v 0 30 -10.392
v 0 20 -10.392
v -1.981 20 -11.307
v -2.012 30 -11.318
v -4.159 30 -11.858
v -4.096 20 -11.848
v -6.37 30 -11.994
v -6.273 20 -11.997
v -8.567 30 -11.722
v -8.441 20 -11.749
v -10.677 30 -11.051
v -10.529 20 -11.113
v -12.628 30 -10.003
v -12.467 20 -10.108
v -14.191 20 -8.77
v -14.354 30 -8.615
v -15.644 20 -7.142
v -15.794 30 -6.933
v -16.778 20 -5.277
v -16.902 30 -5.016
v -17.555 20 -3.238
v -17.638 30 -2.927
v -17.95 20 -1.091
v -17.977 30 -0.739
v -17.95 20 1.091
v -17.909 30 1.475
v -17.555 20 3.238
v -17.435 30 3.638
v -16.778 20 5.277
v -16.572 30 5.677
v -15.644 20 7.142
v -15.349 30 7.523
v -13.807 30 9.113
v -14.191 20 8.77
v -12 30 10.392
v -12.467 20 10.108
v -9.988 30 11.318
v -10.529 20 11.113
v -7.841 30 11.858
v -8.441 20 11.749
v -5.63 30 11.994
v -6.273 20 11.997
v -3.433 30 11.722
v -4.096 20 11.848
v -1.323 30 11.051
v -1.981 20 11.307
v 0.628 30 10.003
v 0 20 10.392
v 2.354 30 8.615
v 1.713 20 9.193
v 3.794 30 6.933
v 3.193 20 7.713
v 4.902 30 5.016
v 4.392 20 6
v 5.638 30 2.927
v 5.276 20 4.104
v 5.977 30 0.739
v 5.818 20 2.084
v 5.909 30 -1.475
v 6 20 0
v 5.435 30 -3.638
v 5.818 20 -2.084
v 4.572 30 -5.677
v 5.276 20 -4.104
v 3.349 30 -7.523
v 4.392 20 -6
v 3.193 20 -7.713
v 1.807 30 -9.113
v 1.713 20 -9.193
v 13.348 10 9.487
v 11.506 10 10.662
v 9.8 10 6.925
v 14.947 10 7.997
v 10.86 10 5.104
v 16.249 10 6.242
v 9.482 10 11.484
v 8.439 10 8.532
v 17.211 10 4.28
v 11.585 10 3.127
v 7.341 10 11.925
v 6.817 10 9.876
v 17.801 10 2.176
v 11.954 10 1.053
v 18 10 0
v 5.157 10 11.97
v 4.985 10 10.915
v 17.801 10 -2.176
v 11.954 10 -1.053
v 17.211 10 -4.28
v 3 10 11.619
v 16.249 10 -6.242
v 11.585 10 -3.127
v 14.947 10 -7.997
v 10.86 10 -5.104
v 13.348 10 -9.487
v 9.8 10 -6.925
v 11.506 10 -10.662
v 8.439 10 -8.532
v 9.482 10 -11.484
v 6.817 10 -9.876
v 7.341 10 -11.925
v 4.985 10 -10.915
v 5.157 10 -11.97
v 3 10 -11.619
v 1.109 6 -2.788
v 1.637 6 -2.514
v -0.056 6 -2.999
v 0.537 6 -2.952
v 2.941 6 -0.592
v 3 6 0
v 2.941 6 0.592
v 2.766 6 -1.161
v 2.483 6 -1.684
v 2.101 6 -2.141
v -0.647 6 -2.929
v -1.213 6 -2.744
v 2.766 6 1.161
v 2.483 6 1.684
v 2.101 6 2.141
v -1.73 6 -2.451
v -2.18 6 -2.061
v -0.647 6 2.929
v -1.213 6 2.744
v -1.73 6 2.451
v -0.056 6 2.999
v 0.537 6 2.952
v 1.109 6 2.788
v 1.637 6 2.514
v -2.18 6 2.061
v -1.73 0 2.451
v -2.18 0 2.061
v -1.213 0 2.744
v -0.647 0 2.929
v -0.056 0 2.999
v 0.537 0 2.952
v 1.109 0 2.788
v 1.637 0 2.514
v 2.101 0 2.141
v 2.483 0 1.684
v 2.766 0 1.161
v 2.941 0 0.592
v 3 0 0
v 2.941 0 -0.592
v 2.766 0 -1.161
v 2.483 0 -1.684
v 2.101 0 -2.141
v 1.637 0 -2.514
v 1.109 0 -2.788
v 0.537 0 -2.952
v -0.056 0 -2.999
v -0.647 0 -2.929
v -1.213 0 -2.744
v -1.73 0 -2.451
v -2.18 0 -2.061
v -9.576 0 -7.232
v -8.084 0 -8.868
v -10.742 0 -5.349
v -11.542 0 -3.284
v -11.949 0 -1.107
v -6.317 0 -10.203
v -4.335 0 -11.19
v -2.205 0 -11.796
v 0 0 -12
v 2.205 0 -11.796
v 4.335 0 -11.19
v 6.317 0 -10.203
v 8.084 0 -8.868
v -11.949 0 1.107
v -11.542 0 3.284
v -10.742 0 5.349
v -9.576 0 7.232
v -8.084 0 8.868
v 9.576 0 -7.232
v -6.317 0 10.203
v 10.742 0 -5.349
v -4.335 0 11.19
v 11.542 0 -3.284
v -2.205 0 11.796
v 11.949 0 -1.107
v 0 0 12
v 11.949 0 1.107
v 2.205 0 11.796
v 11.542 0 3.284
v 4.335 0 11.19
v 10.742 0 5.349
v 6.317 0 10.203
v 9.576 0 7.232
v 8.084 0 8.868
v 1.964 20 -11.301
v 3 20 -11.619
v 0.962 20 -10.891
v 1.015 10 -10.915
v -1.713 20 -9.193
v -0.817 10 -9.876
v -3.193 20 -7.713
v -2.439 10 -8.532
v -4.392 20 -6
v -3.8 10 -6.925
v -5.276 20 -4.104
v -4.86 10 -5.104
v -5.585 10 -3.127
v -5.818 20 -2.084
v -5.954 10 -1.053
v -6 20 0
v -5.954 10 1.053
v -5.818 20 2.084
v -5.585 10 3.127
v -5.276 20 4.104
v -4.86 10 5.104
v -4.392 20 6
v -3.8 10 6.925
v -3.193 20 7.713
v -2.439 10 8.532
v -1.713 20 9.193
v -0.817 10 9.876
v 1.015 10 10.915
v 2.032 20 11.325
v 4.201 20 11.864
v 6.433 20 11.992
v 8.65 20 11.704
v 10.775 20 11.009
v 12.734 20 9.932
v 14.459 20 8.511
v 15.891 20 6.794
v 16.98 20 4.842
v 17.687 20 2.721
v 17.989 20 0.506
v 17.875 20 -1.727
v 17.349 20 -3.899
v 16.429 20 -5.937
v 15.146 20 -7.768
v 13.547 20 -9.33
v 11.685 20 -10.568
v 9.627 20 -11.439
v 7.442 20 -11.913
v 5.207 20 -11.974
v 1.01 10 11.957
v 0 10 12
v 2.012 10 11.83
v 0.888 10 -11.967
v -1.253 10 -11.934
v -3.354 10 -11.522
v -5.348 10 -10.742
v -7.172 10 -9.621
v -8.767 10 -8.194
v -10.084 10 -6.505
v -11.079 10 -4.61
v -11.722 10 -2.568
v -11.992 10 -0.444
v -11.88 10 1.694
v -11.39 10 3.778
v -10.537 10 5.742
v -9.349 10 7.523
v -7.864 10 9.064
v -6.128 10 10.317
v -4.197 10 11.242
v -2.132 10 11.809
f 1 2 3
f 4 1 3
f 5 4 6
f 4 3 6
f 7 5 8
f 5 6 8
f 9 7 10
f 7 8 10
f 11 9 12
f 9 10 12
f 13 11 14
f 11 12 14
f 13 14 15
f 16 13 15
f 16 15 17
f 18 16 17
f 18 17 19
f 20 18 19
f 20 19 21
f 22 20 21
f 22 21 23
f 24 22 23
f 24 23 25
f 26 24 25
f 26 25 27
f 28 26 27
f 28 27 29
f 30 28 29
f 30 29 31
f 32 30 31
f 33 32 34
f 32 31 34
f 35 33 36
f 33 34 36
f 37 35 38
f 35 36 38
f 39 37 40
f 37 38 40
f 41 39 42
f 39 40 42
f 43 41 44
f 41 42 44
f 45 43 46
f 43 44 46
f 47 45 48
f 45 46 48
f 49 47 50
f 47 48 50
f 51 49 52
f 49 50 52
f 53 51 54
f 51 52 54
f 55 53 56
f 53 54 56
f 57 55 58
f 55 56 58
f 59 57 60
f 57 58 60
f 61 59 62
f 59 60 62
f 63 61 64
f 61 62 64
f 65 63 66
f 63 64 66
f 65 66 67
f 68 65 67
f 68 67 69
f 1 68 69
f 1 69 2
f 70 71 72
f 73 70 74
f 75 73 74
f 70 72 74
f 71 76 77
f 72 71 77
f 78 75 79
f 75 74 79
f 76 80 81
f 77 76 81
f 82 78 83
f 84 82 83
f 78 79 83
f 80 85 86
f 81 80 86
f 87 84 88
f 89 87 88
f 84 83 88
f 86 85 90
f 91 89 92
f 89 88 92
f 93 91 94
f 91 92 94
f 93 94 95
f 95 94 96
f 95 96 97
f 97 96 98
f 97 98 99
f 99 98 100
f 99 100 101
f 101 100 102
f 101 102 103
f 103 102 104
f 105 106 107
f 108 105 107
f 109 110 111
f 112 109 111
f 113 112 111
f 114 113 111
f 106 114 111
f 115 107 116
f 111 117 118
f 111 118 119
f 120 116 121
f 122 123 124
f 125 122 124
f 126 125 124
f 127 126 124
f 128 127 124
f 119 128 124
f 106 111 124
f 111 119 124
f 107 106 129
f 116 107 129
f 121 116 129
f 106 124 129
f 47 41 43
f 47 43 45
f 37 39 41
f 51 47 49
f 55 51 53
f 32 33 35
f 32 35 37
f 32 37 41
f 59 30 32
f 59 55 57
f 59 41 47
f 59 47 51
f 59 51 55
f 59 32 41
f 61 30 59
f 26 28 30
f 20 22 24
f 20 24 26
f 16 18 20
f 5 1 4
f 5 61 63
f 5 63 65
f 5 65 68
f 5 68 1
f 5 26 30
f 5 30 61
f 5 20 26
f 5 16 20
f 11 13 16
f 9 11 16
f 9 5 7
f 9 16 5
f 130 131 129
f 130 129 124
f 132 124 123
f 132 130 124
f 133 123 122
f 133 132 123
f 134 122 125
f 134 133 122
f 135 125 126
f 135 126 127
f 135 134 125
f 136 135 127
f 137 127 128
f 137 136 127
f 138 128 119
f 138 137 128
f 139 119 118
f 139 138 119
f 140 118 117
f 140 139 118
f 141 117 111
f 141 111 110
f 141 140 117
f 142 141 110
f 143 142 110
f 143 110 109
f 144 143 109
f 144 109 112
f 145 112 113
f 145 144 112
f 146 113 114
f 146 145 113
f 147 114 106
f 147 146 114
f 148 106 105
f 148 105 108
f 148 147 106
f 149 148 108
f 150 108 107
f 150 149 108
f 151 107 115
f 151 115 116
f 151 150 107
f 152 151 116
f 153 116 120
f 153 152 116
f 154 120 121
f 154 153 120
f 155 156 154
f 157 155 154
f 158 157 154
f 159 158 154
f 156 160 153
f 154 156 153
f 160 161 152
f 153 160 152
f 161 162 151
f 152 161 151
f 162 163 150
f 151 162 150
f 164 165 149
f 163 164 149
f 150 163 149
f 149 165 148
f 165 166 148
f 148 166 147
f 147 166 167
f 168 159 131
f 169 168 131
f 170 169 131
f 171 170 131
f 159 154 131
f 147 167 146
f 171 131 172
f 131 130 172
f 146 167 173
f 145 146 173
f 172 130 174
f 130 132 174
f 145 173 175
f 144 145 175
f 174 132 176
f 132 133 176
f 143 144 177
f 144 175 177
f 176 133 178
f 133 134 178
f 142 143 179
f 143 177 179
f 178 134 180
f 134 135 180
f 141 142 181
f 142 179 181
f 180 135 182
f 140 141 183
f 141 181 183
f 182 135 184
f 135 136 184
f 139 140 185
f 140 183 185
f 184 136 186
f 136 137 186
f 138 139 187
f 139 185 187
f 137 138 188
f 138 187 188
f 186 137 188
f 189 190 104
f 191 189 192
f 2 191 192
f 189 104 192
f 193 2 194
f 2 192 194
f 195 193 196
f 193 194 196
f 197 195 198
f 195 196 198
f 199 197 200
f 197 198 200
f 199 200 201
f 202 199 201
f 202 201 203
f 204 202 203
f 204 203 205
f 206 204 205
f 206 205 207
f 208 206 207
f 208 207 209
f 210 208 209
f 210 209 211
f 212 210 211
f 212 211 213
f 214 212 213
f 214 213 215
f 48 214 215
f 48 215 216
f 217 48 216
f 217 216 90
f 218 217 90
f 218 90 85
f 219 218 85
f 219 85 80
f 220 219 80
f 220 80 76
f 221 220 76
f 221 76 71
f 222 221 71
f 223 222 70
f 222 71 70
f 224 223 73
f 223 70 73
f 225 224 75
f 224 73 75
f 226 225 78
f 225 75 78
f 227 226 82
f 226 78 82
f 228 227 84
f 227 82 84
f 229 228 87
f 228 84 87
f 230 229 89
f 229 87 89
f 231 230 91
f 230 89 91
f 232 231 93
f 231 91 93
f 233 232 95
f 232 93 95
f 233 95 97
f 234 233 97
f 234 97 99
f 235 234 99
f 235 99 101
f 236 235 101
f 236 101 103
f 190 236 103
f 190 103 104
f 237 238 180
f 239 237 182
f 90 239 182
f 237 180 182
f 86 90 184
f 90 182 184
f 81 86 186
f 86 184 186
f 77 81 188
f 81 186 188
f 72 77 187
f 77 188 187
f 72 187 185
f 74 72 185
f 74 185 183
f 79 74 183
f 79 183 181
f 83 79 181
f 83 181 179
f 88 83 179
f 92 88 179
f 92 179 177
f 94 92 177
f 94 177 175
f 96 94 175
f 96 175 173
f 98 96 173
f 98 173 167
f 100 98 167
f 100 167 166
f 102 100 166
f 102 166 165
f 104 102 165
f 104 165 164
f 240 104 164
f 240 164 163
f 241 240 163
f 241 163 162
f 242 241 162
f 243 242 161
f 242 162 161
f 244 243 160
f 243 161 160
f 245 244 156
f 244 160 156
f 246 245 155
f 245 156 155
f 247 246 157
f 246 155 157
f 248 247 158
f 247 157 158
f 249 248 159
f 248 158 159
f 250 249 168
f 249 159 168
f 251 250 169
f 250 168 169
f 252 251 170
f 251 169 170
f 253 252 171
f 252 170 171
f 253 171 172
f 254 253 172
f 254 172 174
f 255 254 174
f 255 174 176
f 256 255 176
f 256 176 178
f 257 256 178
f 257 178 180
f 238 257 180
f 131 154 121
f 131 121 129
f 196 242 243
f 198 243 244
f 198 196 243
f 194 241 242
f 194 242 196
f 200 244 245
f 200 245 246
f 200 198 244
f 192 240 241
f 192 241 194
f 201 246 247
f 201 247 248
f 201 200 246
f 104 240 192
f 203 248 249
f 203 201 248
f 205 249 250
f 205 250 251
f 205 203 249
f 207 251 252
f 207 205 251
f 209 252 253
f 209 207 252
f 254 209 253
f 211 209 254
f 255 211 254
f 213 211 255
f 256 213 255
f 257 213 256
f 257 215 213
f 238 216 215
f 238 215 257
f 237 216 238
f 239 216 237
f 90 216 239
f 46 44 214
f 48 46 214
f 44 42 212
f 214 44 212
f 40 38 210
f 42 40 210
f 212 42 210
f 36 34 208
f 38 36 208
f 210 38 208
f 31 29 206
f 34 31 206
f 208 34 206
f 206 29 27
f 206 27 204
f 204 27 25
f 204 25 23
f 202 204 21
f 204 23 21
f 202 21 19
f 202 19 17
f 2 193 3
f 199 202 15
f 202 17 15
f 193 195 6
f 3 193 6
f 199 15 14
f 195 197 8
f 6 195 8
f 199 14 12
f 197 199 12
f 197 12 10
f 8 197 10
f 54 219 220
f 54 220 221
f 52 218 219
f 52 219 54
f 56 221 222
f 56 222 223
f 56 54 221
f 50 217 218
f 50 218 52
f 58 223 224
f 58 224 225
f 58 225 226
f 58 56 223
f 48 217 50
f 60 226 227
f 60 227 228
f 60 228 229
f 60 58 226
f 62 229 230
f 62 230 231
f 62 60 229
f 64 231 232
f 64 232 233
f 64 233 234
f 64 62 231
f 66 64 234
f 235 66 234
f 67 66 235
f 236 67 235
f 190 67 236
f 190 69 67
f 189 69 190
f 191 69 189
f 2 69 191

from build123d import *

# Parameters (mm, degrees)
SKETCH1_R           = 12
BOSS_EXTRUDE1_DEPTH = 10
SKETCH2_R           = 12
BOSS_EXTRUDE2_DEPTH = 10
SKETCH3_R           = 12
BOSS_EXTRUDE3_DEPTH = 10
CUT_EXTRUDE1_DEPTH  = 6


with BuildPart() as part:
    # Sketch1 → Boss-Extrude1 (new body)
    with BuildSketch(Plane(origin=(0, 0, 0), x_dir=(1, 0, 0), z_dir=(0, 1, 0))):
        with Locations(Location((0, 0, 0), (0, 0, 270))):
            Circle(SKETCH1_R)
    extrude(amount=BOSS_EXTRUDE1_DEPTH)

    # Sketch2 → Boss-Extrude2 (add)
    with BuildSketch(Plane(origin=(0, 10, 0), x_dir=(1, 0, 0), z_dir=(0, 1, 0))):
        with Locations(Location((6, 0, 0), (0, 0, 104.477512186))):
            Circle(SKETCH2_R)
    extrude(amount=BOSS_EXTRUDE2_DEPTH)

    # Sketch3 → Boss-Extrude3 (add)
    with BuildSketch(Plane(origin=(0, 20, 0), x_dir=(1, 0, 0), z_dir=(0, 1, 0))):
        with Locations(Location((-6, 0, 0), (0, 0, 60))):
            Circle(SKETCH3_R)
    extrude(amount=BOSS_EXTRUDE3_DEPTH)

    # Sketch4 → Cut-Extrude1 (cut)
    with BuildSketch(Plane.XZ):
        with BuildLine():
            Line((-2.180114967, -2.060849032), (-2.180114967, 2.060849032))
            ThreePointArc((-2.180114967, 2.060849032), (3, 0), (-2.180114967, -2.060849032))
        make_face()
    extrude(amount=-CUT_EXTRUDE1_DEPTH, mode=Mode.SUBTRACT)


solid = part.part
